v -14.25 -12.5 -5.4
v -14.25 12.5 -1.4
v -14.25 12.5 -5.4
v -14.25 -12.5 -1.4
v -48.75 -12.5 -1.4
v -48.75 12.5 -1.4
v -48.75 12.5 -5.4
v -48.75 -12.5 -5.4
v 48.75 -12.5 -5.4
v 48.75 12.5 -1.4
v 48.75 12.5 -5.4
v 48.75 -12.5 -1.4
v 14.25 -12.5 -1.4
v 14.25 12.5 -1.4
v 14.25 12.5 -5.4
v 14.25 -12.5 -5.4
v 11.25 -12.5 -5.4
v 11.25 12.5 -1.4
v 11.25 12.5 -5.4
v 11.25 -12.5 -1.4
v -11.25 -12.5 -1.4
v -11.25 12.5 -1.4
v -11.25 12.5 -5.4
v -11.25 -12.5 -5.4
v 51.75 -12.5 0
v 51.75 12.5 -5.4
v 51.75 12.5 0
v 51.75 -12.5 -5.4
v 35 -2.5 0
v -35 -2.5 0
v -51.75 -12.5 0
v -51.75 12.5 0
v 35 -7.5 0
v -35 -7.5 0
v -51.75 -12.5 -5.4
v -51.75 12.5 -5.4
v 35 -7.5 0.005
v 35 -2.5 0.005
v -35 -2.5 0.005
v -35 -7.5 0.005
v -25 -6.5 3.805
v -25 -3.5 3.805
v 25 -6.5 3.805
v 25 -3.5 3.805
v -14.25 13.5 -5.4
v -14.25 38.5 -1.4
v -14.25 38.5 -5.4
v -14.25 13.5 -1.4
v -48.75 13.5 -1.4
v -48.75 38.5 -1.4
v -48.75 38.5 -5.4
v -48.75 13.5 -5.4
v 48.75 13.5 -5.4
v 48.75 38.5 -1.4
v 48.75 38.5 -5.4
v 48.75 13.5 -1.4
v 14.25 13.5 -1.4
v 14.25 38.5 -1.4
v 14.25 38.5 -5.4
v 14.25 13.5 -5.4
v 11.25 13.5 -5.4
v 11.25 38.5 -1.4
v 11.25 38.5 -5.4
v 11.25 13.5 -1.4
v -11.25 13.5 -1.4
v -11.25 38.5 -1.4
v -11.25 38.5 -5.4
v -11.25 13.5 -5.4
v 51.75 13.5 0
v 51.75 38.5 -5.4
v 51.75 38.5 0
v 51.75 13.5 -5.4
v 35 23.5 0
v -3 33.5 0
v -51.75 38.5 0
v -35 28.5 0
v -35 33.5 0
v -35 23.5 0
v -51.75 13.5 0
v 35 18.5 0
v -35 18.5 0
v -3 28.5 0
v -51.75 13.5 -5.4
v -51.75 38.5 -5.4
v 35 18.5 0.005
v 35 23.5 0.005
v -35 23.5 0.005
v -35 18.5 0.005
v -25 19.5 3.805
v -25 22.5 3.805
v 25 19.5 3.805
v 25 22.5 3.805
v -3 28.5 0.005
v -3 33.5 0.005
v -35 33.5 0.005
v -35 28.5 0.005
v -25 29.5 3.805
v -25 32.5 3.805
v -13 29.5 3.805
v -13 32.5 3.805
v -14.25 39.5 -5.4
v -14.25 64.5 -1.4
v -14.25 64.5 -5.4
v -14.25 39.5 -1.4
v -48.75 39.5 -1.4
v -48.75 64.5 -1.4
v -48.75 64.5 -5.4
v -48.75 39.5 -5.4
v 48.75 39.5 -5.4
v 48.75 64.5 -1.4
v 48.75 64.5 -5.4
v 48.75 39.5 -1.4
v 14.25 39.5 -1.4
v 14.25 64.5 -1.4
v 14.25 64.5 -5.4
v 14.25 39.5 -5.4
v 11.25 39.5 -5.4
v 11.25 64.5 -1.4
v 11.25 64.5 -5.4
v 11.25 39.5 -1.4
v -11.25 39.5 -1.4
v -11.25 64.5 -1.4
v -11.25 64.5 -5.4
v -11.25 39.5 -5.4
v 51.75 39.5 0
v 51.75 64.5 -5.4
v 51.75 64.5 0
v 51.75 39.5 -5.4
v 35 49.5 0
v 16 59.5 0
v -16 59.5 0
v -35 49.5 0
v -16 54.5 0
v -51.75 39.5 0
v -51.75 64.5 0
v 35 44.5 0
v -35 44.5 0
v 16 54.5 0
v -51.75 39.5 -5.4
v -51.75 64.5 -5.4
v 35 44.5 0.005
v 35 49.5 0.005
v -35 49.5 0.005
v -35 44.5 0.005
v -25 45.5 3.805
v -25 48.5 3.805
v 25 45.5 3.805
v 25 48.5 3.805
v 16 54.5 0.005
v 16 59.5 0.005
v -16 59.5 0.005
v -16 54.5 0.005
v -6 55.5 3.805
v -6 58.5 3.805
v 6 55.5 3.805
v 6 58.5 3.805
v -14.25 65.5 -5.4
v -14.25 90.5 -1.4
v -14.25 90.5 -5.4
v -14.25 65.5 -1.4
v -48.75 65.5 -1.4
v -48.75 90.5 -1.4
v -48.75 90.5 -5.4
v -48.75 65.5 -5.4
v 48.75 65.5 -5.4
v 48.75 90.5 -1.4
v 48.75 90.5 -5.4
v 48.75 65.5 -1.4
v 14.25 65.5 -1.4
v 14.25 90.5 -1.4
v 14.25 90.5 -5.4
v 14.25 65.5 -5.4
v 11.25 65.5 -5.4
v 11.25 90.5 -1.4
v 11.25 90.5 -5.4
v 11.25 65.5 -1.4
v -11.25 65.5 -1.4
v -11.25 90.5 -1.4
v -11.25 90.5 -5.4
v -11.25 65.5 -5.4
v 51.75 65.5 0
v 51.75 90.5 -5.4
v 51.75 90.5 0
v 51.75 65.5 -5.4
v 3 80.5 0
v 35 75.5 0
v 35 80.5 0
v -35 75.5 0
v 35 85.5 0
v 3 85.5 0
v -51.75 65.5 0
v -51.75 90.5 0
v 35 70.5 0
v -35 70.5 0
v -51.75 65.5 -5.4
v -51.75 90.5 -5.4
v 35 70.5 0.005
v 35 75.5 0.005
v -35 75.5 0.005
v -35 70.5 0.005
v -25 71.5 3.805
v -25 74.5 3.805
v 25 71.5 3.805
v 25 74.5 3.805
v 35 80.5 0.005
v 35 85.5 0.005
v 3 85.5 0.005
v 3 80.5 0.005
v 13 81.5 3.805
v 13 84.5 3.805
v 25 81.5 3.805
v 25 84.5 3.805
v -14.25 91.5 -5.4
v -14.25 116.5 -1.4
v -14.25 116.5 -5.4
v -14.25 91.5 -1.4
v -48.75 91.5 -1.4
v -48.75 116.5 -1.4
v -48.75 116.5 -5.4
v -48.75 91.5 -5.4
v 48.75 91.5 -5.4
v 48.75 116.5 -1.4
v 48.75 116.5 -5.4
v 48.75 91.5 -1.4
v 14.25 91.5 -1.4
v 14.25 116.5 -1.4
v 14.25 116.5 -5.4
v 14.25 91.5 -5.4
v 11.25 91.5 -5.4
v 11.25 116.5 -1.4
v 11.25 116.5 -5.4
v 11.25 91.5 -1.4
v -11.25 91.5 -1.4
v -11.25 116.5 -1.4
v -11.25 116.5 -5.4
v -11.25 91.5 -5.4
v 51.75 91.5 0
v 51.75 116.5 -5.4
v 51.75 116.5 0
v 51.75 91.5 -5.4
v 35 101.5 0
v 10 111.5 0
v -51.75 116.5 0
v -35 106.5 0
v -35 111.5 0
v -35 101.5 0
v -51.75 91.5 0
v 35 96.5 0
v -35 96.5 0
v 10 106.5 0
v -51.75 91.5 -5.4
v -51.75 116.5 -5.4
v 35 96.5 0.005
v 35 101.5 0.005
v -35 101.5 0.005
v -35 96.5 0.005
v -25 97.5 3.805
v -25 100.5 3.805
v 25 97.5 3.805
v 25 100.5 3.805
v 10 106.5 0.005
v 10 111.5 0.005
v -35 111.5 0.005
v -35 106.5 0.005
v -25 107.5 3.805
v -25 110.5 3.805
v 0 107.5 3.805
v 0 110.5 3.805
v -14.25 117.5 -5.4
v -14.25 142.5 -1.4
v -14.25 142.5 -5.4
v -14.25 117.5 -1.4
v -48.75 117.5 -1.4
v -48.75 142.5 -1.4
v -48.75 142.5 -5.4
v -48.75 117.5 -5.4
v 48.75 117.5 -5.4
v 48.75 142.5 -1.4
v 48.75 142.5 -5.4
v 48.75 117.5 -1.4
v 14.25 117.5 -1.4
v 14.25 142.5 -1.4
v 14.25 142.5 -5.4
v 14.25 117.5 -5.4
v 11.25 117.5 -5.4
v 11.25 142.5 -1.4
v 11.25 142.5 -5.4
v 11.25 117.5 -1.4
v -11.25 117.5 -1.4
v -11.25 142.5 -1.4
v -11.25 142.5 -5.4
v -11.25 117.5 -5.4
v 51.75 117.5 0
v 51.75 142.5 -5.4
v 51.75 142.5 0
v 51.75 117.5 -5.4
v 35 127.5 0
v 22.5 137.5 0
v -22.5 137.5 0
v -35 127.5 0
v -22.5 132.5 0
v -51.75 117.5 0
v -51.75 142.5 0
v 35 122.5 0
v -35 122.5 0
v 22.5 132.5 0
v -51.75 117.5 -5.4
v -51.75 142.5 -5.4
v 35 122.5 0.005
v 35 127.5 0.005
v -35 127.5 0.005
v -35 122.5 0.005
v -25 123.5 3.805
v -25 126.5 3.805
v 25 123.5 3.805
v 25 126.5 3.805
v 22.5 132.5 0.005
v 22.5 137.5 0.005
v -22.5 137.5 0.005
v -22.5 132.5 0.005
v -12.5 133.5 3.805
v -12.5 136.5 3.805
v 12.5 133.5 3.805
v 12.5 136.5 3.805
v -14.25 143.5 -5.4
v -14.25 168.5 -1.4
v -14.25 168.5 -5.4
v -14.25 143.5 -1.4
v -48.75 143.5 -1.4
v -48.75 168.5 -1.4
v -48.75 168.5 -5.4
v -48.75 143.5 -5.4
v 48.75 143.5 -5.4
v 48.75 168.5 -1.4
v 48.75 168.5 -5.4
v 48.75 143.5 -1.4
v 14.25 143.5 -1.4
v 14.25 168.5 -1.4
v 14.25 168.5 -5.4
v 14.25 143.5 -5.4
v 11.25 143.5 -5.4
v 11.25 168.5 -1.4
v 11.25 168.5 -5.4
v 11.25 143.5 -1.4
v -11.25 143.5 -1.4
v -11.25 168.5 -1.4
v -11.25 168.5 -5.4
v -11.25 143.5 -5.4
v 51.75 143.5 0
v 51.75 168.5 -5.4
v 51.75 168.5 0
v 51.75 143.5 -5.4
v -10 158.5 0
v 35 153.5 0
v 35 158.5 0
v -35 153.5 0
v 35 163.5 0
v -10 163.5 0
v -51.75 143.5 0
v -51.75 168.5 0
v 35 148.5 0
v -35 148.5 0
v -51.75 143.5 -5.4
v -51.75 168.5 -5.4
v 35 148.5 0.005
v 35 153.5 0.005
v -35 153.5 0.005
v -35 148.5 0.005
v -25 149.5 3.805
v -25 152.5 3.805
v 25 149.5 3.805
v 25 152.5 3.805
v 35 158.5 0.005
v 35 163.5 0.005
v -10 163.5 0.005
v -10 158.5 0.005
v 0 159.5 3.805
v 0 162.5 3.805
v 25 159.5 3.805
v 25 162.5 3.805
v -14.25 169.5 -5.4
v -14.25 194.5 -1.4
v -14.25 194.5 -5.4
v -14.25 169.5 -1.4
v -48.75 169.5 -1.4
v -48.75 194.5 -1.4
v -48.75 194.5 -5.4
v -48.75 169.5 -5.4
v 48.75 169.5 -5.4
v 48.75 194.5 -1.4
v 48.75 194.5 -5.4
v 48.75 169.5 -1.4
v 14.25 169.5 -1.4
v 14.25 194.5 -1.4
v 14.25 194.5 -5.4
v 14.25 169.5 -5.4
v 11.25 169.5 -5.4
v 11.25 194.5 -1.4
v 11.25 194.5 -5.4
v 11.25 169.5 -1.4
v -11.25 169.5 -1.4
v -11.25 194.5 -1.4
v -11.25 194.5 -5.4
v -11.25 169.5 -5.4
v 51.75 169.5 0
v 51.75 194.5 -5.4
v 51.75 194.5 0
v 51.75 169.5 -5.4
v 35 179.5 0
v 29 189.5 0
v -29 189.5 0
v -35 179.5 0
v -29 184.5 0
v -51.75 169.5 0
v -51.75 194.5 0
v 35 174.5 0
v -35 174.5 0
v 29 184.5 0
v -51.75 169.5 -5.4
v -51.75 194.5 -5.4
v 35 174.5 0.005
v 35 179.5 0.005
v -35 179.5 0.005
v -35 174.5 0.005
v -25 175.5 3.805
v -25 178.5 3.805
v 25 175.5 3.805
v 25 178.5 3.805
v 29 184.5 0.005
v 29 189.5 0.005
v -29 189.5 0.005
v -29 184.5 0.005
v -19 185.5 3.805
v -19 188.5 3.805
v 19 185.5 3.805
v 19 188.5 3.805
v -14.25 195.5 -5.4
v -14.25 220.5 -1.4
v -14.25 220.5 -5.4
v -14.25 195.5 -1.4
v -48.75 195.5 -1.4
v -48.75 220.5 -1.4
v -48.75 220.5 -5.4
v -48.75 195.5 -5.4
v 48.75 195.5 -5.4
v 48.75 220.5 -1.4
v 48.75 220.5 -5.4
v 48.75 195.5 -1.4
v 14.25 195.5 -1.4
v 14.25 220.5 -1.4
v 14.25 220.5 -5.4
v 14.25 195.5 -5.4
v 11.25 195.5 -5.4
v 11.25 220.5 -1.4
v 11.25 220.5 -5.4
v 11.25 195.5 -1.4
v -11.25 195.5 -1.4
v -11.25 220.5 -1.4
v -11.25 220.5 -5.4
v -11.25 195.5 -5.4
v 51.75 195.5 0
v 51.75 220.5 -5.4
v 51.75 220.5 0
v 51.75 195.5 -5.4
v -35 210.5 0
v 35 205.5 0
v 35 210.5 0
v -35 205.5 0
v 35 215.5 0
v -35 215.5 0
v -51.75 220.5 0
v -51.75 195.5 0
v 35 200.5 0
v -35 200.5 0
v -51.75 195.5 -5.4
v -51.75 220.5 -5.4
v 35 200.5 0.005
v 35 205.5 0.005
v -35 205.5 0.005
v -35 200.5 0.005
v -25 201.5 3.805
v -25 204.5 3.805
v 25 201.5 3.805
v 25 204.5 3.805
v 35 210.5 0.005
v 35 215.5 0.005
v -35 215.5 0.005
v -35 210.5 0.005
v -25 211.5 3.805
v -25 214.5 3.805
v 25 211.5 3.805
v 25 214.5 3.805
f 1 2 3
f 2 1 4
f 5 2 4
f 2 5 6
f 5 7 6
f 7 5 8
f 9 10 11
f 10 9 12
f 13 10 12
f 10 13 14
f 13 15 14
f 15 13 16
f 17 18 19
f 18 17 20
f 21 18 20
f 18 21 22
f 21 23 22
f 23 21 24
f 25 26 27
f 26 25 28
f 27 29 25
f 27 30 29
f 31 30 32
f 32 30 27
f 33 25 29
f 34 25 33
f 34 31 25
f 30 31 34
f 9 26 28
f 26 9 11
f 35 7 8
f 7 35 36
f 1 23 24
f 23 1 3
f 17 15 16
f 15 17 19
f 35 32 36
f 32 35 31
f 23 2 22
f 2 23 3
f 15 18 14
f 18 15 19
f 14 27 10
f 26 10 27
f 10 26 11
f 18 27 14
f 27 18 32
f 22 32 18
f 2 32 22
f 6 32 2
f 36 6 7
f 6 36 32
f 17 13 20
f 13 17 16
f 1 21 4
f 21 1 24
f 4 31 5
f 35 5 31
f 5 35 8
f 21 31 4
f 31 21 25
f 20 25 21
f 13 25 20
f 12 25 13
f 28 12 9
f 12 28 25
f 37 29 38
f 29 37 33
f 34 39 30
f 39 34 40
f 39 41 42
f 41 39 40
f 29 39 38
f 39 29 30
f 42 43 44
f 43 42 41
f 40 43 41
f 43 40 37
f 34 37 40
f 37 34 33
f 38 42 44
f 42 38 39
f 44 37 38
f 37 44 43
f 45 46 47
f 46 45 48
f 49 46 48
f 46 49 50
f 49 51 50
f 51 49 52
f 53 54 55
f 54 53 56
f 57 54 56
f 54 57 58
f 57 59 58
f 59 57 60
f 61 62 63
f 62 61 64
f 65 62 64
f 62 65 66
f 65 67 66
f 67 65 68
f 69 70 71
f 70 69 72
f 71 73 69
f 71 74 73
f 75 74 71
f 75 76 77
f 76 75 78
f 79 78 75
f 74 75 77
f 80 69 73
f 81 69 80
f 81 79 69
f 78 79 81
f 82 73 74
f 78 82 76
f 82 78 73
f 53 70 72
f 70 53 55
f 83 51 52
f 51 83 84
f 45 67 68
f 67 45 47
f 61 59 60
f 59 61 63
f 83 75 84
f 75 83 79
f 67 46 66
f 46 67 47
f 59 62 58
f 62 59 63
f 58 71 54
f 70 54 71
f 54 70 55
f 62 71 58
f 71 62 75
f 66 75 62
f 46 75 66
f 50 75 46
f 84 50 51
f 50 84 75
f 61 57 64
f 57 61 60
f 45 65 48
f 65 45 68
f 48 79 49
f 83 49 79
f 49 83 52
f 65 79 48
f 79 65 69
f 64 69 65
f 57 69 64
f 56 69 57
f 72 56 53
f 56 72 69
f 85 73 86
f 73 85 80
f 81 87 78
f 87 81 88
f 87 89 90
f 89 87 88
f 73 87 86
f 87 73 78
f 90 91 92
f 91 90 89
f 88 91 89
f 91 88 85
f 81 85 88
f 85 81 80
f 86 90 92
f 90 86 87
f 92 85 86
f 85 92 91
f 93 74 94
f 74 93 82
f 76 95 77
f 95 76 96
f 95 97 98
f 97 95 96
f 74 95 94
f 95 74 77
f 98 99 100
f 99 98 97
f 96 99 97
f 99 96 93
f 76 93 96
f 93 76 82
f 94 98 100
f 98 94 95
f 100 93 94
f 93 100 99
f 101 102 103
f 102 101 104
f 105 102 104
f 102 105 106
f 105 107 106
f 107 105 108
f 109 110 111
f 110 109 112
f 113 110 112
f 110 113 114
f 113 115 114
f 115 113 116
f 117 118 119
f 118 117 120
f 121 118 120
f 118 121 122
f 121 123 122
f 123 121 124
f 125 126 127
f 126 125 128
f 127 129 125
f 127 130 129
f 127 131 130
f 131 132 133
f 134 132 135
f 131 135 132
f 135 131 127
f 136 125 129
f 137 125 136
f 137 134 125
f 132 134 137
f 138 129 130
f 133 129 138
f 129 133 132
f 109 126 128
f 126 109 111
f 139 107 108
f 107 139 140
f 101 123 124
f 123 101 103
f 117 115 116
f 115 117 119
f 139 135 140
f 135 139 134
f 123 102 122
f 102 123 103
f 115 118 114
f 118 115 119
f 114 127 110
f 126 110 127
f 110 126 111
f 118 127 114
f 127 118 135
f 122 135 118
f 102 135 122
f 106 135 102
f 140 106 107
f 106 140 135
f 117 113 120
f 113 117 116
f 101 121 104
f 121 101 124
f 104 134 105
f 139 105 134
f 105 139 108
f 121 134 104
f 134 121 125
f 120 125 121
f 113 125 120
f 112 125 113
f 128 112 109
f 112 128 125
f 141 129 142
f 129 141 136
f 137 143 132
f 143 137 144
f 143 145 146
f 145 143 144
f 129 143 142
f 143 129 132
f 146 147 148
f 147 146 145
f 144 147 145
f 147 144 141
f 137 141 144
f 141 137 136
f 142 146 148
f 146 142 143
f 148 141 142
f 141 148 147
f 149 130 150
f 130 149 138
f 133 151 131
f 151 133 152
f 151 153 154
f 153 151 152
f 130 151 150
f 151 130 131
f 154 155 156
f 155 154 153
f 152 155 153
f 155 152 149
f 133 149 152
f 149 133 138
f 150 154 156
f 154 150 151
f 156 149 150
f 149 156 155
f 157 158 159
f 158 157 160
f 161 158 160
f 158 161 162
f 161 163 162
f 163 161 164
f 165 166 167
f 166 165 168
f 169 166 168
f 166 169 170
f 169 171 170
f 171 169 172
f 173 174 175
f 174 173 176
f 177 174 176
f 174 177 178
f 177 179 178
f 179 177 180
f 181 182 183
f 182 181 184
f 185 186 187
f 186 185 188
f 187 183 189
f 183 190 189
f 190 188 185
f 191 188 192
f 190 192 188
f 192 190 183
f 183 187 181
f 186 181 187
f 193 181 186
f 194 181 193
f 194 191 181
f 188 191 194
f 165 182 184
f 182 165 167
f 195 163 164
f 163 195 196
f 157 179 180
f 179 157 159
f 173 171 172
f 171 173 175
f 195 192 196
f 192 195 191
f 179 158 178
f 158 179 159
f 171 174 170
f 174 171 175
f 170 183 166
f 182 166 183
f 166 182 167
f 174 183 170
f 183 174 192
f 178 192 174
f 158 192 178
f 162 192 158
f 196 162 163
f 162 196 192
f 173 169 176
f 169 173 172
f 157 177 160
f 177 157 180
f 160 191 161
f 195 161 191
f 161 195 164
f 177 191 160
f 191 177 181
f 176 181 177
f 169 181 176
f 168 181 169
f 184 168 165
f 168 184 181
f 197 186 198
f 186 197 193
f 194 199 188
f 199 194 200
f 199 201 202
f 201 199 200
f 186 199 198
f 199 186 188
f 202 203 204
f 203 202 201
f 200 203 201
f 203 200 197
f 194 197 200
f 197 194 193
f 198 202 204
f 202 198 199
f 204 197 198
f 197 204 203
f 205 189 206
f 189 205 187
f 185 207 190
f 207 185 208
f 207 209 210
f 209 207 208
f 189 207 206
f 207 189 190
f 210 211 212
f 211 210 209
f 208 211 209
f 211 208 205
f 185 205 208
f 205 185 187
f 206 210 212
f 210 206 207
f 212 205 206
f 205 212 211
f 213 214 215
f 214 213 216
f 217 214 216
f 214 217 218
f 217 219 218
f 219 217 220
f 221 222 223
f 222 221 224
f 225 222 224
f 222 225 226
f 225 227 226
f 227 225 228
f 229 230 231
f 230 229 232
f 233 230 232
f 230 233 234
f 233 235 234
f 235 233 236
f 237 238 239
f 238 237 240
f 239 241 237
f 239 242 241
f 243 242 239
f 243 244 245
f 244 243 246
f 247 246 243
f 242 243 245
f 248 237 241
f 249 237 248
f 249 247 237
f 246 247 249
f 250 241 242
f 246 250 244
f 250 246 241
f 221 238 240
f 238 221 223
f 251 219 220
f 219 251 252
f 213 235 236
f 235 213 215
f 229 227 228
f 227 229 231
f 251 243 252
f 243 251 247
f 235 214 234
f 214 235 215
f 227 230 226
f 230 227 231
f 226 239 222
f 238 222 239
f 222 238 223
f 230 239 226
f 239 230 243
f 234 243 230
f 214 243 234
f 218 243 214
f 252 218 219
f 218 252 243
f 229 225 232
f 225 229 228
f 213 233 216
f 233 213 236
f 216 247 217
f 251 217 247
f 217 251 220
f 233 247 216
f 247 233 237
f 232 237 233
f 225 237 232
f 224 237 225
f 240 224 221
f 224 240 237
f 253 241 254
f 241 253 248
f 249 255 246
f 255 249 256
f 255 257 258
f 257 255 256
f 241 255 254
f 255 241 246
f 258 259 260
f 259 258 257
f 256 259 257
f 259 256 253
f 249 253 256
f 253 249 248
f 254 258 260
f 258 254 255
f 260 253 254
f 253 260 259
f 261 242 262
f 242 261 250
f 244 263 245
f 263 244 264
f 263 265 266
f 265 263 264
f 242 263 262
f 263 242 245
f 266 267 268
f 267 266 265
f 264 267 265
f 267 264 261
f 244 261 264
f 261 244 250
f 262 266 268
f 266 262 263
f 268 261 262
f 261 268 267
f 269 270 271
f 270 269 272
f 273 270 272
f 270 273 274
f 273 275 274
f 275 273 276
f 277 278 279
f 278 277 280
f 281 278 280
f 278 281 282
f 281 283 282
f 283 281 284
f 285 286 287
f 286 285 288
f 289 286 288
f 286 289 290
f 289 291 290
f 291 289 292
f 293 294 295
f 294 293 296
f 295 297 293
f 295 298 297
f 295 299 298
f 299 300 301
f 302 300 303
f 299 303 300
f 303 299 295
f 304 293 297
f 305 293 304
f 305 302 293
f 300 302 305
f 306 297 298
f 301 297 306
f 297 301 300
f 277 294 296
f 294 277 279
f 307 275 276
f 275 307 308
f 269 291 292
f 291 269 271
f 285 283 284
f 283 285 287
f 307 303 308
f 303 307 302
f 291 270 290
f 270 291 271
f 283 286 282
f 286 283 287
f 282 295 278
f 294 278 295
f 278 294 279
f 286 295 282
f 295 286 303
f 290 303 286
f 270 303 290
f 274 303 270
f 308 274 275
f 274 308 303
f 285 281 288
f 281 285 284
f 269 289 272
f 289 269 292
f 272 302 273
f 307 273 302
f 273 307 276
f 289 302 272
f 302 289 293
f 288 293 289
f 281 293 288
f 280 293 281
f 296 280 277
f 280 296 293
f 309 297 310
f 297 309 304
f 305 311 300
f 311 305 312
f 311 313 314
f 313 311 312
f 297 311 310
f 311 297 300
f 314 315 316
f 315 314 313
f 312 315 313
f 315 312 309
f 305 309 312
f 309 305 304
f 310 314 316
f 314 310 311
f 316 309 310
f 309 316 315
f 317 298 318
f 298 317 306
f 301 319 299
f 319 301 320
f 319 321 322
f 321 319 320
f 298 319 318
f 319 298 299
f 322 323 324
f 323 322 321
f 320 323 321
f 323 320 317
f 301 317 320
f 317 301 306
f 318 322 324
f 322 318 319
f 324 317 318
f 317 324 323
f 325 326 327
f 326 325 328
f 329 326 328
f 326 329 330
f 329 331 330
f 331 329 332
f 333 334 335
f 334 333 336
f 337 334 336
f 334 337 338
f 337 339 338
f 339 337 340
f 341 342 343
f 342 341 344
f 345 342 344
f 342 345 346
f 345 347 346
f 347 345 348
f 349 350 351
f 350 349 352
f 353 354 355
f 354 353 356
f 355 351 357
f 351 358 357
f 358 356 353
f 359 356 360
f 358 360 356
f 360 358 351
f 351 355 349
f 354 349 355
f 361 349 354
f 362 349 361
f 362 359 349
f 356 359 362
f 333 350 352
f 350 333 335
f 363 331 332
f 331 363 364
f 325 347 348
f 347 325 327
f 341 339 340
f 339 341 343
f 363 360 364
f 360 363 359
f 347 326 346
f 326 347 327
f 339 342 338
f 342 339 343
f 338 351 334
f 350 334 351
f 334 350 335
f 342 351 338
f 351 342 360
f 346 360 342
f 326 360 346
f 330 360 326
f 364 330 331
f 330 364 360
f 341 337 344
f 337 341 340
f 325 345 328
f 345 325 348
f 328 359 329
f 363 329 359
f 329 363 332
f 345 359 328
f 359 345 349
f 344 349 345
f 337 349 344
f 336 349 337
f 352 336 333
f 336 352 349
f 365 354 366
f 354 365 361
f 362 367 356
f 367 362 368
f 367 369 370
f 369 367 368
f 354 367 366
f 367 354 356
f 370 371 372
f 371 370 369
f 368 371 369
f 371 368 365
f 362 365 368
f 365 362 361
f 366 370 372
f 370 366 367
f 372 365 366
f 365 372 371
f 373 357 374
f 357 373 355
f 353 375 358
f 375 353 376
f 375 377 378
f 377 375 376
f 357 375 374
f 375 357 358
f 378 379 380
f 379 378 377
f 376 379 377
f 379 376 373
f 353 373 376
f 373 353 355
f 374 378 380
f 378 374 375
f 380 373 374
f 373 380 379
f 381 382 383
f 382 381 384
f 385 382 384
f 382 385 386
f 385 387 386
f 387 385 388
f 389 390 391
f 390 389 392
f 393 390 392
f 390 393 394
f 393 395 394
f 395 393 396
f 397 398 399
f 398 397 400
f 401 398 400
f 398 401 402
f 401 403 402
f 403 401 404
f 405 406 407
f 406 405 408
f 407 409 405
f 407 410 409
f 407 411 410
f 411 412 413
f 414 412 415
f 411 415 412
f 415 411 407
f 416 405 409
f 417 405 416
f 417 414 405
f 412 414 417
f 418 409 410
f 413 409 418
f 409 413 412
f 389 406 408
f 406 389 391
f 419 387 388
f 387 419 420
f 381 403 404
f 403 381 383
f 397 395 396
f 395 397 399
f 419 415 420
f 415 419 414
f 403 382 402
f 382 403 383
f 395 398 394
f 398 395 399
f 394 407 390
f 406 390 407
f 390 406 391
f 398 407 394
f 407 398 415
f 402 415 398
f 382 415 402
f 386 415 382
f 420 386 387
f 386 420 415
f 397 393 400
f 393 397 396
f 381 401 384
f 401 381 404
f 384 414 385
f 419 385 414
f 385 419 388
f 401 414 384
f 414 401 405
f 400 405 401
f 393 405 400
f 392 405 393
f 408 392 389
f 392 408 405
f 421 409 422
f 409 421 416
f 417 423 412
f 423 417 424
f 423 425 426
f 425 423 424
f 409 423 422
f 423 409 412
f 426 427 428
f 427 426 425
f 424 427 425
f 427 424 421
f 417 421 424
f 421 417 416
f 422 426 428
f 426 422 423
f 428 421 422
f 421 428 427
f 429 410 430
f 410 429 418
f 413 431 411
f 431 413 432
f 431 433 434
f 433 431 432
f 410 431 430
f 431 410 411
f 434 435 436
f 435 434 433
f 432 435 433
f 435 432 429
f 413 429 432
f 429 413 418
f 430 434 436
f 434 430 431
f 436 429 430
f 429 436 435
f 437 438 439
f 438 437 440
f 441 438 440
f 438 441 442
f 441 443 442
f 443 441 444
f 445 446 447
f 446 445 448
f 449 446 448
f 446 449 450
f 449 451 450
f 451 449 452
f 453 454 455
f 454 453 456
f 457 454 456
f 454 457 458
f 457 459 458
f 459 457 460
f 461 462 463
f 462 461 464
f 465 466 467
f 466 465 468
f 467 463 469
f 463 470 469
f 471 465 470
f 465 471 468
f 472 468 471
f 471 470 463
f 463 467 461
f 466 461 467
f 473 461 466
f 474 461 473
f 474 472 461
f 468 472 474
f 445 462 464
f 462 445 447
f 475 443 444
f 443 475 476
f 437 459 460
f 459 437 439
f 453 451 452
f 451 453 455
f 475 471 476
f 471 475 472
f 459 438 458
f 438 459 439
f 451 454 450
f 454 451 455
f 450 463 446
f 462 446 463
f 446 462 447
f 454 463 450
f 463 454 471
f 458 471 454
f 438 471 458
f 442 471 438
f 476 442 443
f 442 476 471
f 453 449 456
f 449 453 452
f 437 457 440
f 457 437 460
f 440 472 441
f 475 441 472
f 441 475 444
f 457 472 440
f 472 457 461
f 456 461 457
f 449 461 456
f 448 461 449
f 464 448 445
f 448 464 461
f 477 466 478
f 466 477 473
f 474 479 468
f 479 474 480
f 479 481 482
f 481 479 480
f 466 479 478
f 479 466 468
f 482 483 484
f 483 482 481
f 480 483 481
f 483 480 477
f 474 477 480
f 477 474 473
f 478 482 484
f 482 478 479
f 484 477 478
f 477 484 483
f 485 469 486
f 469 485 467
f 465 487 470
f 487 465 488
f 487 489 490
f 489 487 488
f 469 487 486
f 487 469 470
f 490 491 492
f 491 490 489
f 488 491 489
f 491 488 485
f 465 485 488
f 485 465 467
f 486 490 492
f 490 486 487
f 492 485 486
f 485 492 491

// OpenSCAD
$fn=60;

// modification of duplo figure leg for locomotive engineer
module driver()
{
  difference()
  {
    union()
    {
      cube([3,4.4,5.6],center=true);
      translate([0,0,-2.8])
        cylinder(d=3.5,h=5.4+5.6);
    }
    translate([0,0,-.6])
      cube([1.8,100,5.6],center=true);
  }
}


// intellitrain tiles
module tile(pos=0,len=1)
{
  Lsegment=31.5;
  L=Lsegment*3;
  W=25;
  gr=1.4;
  up=5.2-gr;
  down=4;
  space=32;
  
  Lbar1=12;
  Lbar2=25;
  Lbar3=38;
  Lbar4=50;
  
  lentab=[[1,Lbar1],[2,Lbar2],[3,Lbar3],[4,Lbar4]];
  
  off_axis=5;
  barW1=5;
  barW2=3;
  
  module bar(L=Lbar4)
  {
    hull()
    {
      cube([L+20,barW1,.01],center=true);
      translate([0,0,up])
        cube([L,barW2,.01],center=true);
    }
  }
    
  translate([0,0,-(down+gr)/2])
  {
    difference()
    {
      cube([L+9,W,down+gr],center=true);
      translate([0,0,-gr])
      {
        for(i=[-1,1])
          translate([i*Lsegment,0,0])
            cube([Lsegment+3,1000,down+gr],center=true);
        cube([Lsegment-9,1000,down+gr],center=true);
      }
    }
  }
  translate([0,-off_axis,0])
    bar();
  if( len>0 )
  {
    ll=lookup(len,lentab);
    translate([pos*(Lbar4-ll)/2,off_axis,0])
      bar(ll);
  }
}

//driver();

module tile_reverse(){  tile( 0,0);  }
module tile_station(){  tile(-1,1);  }
module tile_horn()   {  tile( 0,1);  }
module tile_shop()   {  tile( 1,1);  }
module tile_wash()   {  tile(-1,2);  }
module tile_cargo()  {  tile( 0,2);  }
module tile_tunnel() {  tile( 1,2);  }
module tile_notuse1(){  tile(-1,3);  }
module tile_fuel()   {  tile( 0,3);  }
module tile_notuse2(){  tile( 1,3);  }
module tile_stop()   {  tile( 0,4);  }

//tile_reverse();
//tile_station();
//tile_horn();
//tile_shop();
//tile_wash(); 
//tile_cargo();
//tile_tunnel();
//tile_fuel();
//tile_stop();


module alltiles(n=[0:1:8])
{
  alltiles_tab = [
    [ 0, 0 ],
    [-1, 1 ],
    [ 0, 1 ],
    [ 1, 1 ],
    [-1, 2 ],
    [ 0, 2 ],
    [ 1, 2 ],
    //[-1, 3 ],
    [ 0, 3 ],
    //[ 1, 3 ],
    [ 0, 4 ]
  ];

  for( nn=n )
  {
    i=alltiles_tab[nn];
    translate([0,nn*26,0])
      tile(i[0],i[1]);
  }
}

alltiles();
